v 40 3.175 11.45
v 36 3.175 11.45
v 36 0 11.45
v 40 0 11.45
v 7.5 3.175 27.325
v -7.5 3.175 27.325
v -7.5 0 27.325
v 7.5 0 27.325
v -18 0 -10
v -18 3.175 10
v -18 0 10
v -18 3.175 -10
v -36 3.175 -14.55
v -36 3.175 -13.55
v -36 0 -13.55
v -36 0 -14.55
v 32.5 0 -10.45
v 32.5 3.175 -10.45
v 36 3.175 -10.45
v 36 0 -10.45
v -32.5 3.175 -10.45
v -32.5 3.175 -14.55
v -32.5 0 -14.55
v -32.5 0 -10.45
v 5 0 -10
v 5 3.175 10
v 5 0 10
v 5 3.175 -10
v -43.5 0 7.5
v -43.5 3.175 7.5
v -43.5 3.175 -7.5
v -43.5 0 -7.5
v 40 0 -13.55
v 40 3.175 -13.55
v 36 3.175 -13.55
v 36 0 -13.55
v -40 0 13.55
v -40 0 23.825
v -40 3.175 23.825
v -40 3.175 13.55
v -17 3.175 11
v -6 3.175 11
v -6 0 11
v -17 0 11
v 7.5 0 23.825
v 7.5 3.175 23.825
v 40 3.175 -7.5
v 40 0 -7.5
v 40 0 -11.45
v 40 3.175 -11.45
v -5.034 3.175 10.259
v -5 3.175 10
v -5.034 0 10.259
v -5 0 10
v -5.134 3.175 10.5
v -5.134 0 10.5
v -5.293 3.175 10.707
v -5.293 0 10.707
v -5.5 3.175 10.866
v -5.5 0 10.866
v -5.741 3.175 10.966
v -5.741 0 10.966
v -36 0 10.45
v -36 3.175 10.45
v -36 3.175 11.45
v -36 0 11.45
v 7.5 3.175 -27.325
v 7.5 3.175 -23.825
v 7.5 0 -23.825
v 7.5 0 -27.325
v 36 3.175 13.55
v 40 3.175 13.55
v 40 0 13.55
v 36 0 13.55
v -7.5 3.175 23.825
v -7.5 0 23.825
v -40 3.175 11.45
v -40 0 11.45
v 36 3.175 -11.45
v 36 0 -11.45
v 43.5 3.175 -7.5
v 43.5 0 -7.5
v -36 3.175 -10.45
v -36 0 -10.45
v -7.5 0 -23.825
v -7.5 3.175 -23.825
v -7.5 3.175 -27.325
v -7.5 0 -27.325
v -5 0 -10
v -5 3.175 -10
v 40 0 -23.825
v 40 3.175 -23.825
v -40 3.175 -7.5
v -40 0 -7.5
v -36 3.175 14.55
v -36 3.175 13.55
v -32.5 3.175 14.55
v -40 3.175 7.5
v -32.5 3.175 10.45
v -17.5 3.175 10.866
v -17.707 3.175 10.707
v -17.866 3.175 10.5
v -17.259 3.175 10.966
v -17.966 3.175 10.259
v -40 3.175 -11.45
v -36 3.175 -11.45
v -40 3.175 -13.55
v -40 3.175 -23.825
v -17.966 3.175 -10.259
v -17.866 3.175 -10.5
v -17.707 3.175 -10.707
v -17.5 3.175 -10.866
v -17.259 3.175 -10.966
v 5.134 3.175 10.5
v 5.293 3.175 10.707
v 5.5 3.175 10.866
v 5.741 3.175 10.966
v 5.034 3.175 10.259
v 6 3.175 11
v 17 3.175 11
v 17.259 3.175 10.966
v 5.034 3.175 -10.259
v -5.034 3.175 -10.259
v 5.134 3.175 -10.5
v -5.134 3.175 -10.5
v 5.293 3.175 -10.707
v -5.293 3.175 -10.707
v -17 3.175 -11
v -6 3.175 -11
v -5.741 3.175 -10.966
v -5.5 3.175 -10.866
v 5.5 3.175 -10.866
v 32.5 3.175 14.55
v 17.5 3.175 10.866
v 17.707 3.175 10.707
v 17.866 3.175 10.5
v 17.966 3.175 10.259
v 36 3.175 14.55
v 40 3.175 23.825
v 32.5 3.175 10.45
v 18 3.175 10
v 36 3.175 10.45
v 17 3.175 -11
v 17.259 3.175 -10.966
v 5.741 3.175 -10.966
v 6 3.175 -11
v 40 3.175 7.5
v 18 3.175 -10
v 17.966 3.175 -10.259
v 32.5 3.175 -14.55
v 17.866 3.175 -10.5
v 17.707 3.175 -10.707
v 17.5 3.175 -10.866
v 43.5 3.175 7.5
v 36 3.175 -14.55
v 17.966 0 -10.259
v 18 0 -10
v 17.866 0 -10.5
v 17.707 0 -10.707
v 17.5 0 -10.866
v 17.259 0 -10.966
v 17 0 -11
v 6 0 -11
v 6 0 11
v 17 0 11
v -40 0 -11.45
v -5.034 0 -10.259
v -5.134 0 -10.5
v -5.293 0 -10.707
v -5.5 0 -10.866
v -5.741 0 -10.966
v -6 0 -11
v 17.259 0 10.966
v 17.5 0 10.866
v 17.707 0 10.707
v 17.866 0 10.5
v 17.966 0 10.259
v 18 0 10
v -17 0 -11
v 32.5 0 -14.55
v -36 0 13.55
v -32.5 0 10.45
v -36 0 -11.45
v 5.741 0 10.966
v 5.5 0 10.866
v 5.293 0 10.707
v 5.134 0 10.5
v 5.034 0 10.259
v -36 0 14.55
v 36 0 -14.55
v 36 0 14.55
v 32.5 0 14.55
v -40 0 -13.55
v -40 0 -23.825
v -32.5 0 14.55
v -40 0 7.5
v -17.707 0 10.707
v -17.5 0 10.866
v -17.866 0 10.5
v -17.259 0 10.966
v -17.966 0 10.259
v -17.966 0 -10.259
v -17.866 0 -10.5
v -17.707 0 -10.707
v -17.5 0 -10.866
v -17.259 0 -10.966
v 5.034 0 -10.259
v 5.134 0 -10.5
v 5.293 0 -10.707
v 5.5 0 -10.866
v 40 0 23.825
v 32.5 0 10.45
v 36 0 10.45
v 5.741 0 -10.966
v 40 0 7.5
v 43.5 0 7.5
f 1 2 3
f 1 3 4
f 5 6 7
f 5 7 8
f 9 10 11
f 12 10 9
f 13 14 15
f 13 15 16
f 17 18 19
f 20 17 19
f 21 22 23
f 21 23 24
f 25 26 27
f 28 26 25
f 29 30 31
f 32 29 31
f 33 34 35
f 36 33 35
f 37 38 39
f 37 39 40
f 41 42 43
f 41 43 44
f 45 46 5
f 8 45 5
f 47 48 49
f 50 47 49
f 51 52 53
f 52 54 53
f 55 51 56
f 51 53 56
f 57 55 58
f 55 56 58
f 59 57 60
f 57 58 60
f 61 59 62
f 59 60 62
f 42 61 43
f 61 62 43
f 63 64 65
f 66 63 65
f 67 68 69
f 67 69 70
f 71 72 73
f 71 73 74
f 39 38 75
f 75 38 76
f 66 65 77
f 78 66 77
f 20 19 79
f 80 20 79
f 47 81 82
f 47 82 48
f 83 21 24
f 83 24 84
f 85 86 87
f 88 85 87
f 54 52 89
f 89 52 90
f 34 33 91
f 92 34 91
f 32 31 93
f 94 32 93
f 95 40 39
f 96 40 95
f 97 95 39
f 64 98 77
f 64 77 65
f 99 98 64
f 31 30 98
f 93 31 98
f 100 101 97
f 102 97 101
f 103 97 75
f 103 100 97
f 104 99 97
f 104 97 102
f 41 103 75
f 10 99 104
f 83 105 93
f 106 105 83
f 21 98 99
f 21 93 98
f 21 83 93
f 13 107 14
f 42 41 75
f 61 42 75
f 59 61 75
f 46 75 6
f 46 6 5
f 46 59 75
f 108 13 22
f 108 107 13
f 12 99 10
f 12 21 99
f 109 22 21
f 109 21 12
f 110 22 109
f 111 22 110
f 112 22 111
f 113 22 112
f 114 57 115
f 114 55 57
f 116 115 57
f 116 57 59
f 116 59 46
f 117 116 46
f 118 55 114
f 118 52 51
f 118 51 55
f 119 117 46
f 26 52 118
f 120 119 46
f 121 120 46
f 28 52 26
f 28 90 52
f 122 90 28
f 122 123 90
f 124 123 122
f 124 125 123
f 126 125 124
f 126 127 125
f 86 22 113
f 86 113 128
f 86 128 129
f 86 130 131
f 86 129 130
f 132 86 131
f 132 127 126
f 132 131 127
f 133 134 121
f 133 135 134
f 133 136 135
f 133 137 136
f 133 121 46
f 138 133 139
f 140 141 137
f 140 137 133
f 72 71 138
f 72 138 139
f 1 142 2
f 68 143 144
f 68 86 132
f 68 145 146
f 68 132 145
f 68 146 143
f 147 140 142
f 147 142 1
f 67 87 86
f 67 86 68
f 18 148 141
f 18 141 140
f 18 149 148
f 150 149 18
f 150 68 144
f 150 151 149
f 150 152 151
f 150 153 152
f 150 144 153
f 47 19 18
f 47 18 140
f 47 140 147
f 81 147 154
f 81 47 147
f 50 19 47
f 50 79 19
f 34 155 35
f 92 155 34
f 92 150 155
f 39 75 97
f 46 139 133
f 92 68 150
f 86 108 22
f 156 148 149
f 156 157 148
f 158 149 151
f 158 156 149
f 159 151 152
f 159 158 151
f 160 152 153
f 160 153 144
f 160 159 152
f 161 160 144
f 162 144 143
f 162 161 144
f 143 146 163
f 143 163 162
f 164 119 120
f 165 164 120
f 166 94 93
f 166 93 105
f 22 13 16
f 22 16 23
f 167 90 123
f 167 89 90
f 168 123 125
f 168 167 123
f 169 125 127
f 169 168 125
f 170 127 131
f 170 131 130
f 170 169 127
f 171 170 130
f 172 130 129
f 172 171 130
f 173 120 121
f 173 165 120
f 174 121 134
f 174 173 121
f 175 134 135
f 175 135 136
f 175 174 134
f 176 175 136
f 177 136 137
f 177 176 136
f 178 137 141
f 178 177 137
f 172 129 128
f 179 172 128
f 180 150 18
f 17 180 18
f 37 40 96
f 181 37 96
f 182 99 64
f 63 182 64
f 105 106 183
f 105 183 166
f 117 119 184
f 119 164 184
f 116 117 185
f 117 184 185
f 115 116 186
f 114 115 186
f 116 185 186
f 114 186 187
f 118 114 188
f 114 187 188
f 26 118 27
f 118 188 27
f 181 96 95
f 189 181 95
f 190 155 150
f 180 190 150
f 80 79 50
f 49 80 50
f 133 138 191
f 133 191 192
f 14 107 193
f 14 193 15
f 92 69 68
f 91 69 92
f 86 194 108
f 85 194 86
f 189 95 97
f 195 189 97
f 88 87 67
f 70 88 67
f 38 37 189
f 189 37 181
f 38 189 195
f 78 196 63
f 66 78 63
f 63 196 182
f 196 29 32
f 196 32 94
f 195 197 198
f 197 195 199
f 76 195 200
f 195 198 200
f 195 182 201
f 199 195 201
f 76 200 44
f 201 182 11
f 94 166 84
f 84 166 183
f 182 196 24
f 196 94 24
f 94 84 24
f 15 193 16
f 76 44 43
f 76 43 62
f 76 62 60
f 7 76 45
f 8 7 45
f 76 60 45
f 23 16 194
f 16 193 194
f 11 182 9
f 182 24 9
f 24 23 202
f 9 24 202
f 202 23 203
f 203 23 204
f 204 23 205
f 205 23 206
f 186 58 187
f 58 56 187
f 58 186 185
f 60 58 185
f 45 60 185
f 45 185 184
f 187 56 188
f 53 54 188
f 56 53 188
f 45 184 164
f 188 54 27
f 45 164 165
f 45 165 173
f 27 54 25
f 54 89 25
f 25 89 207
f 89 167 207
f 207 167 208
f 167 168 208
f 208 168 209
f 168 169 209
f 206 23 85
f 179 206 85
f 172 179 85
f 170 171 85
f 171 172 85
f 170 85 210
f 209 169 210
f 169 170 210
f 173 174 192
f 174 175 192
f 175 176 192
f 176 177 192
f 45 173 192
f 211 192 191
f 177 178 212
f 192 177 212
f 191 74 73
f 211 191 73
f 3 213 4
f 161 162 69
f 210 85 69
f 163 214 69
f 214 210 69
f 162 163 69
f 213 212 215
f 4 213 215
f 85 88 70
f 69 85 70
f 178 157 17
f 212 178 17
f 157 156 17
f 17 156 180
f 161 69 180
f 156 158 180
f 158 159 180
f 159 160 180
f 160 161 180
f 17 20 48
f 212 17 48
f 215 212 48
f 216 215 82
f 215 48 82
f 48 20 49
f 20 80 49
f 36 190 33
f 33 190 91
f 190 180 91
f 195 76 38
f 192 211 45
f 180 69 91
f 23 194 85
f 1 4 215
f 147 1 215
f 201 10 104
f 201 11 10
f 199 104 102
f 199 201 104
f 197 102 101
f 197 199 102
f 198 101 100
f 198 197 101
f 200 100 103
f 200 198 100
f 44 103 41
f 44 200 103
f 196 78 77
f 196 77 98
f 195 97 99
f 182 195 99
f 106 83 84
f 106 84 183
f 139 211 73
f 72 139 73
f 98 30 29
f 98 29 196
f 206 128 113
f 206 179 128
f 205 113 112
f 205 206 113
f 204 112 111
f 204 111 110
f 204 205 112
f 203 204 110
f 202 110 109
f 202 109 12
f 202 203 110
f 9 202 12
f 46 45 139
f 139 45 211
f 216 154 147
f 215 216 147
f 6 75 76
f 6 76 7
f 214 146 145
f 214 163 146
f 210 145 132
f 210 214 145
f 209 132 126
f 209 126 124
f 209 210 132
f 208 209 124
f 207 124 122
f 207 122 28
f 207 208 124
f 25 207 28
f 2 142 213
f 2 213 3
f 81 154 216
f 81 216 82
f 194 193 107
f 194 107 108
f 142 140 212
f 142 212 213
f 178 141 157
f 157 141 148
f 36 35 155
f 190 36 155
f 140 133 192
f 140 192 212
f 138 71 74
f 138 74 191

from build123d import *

# Parameters (mm, degrees)
SKETCH2_W               = 80
SKETCH2_H               = 47.65
BOSS_EXTRUDE1_DEPTH     = 3.175
SKETCH3_W               = 15
SKETCH3_H               = 3.5
BOSS_EXTRUDE2_DEPTH     = 3.175
SKETCH4_W               = 3.5
SKETCH4_H               = 15
BOSS_EXTRUDE3_DEPTH     = 3.175
MIRROR2_COPY_1_SKETCH_W = 3.5
MIRROR2_COPY_1_SKETCH_H = 15
MIRROR2_COPY_1_DEPTH    = 3.175
MIRROR2_COPY_2_SKETCH_W = 3.5
MIRROR2_COPY_2_SKETCH_H = 15
MIRROR2_COPY_2_DEPTH    = 3.175
CUT_EXTRUDE1_DEPTH      = 10
MIRROR4_COPY_1_DEPTH    = 10
SKETCH6_W               = 13
SKETCH6_H               = 22
CUT_EXTRUDE2_DEPTH      = 52.468303353
FILLET1_R               = 1
FILLET1_OF_MIRROR5_R    = 1


with BuildPart() as part:
    # Sketch2 → Boss-Extrude1 (new body)
    with BuildSketch(Plane(origin=(0, 0, 0), x_dir=(1, 0, 0), z_dir=(0, 1, 0))):
        Rectangle(SKETCH2_W, SKETCH2_H)
    extrude(amount=BOSS_EXTRUDE1_DEPTH)

    # Sketch3 → Boss-Extrude2 (add)
    with BuildSketch(Plane(origin=(0, 3.175, 0), x_dir=(1, 0, 0), z_dir=(0, 1, 0))):
        with Locations((0, 25.575)):
            Rectangle(SKETCH3_W, SKETCH3_H)
    boss_extrude2 = extrude(amount=-BOSS_EXTRUDE2_DEPTH)

    # Sketch4 → Boss-Extrude3 (add)
    with BuildSketch(Plane(origin=(0, 3.175, 0), x_dir=(1, 0, 0), z_dir=(0, 1, 0))):
        with Locations((-41.75, 0)):
            Rectangle(SKETCH4_W, SKETCH4_H)
    boss_extrude3 = extrude(amount=-BOSS_EXTRUDE3_DEPTH)

    # Mirror1: Boss-Extrude3 across plane
    add(boss_extrude3.mirror(Plane(origin=(0, 0, 0), x_dir=(0, 0, 1), z_dir=(1, 0, 0))))

    # Mirror2: Boss-Extrude2 across plane
    add(boss_extrude2.mirror(Plane.XY))

    # Mirror2 copy 1 sketch → Mirror2 copy 1 (add)
    with BuildSketch(Plane(origin=(0, 3.175, 0), x_dir=(-1, 0, 0), z_dir=(0, 1, 0))):
        with Locations((-41.75, 0)):
            Rectangle(MIRROR2_COPY_1_SKETCH_W, MIRROR2_COPY_1_SKETCH_H)
    extrude(amount=-MIRROR2_COPY_1_DEPTH)

    # Mirror2 copy 2 sketch → Mirror2 copy 2 (add)
    with BuildSketch(Plane(origin=(0, 3.175, 0), x_dir=(1, 0, 0), z_dir=(0, 1, 0))):
        with Locations((-41.75, 0)):
            Rectangle(MIRROR2_COPY_2_SKETCH_W, MIRROR2_COPY_2_SKETCH_H)
    extrude(amount=-MIRROR2_COPY_2_DEPTH)

    # Sketch5 → Cut-Extrude1 (cut)
    with BuildSketch(Plane(origin=(0, 3.175, 0), x_dir=(1, 0, 0), z_dir=(0, 1, 0))):
        Polygon((-40, 13.55), (-36, 13.55), (-36, 14.55), (-32.5, 14.55), (-32.5, 10.45), (-36, 10.45), (-36, 11.45), (-40, 11.45), align=None)
    cut_extrude1 = extrude(amount=-CUT_EXTRUDE1_DEPTH, mode=Mode.SUBTRACT)

    # Mirror3: Cut-Extrude1 across plane
    add(cut_extrude1.mirror(Plane.XY), mode=Mode.SUBTRACT)

    # Mirror4: Cut-Extrude1 across plane
    add(cut_extrude1.mirror(Plane(origin=(0, 0, 0), x_dir=(0, 0, 1), z_dir=(1, 0, 0))), mode=Mode.SUBTRACT)

    # Mirror4 copy 1 sketch → Mirror4 copy 1 (cut)
    with BuildSketch(Plane(origin=(0, 3.175, 0), x_dir=(-1, 0, 0), z_dir=(0, 1, 0))):
        Polygon((-40, 13.55), (-36, 13.55), (-36, 14.55), (-32.5, 14.55), (-32.5, 10.45), (-36, 10.45), (-36, 11.45), (-40, 11.45), align=None)
    extrude(amount=-MIRROR4_COPY_1_DEPTH, mode=Mode.SUBTRACT)

    # Sketch6 → Cut-Extrude2 (cut, through all)
    with BuildSketch(Plane(origin=(0, 3.175, 0), x_dir=(1, 0, 0), z_dir=(0, 1, 0))):
        with Locations((11.5, 0)):
            Rectangle(SKETCH6_W, SKETCH6_H)
    cut_extrude2 = extrude(amount=-CUT_EXTRUDE2_DEPTH, mode=Mode.SUBTRACT)

    # Fillet1
    fillet1_edges = [part.edges().sort_by_distance(p)[0] for p in [
        (5, 1.5875, 11),
        (5, 1.5875, -11),
        (18, 1.5875, -11),
        (18, 1.5875, 11),
    ]]
    fillet(fillet1_edges, radius=FILLET1_R)

    # Mirror5: Cut-Extrude2 across plane
    add(cut_extrude2.mirror(Plane(origin=(0, 0, 0), x_dir=(0, 0, 1), z_dir=(1, 0, 0))), mode=Mode.SUBTRACT)

    # Fillet1 of Mirror5
    fillet1_of_mirror5_edges = [part.edges().sort_by_distance(p)[0] for p in [
        (-5, 1.5875, 11),
        (-5, 1.5875, -11),
        (-18, 1.5875, -11),
        (-18, 1.5875, 11),
    ]]
    fillet(fillet1_of_mirror5_edges, radius=FILLET1_OF_MIRROR5_R)


solid = part.part
